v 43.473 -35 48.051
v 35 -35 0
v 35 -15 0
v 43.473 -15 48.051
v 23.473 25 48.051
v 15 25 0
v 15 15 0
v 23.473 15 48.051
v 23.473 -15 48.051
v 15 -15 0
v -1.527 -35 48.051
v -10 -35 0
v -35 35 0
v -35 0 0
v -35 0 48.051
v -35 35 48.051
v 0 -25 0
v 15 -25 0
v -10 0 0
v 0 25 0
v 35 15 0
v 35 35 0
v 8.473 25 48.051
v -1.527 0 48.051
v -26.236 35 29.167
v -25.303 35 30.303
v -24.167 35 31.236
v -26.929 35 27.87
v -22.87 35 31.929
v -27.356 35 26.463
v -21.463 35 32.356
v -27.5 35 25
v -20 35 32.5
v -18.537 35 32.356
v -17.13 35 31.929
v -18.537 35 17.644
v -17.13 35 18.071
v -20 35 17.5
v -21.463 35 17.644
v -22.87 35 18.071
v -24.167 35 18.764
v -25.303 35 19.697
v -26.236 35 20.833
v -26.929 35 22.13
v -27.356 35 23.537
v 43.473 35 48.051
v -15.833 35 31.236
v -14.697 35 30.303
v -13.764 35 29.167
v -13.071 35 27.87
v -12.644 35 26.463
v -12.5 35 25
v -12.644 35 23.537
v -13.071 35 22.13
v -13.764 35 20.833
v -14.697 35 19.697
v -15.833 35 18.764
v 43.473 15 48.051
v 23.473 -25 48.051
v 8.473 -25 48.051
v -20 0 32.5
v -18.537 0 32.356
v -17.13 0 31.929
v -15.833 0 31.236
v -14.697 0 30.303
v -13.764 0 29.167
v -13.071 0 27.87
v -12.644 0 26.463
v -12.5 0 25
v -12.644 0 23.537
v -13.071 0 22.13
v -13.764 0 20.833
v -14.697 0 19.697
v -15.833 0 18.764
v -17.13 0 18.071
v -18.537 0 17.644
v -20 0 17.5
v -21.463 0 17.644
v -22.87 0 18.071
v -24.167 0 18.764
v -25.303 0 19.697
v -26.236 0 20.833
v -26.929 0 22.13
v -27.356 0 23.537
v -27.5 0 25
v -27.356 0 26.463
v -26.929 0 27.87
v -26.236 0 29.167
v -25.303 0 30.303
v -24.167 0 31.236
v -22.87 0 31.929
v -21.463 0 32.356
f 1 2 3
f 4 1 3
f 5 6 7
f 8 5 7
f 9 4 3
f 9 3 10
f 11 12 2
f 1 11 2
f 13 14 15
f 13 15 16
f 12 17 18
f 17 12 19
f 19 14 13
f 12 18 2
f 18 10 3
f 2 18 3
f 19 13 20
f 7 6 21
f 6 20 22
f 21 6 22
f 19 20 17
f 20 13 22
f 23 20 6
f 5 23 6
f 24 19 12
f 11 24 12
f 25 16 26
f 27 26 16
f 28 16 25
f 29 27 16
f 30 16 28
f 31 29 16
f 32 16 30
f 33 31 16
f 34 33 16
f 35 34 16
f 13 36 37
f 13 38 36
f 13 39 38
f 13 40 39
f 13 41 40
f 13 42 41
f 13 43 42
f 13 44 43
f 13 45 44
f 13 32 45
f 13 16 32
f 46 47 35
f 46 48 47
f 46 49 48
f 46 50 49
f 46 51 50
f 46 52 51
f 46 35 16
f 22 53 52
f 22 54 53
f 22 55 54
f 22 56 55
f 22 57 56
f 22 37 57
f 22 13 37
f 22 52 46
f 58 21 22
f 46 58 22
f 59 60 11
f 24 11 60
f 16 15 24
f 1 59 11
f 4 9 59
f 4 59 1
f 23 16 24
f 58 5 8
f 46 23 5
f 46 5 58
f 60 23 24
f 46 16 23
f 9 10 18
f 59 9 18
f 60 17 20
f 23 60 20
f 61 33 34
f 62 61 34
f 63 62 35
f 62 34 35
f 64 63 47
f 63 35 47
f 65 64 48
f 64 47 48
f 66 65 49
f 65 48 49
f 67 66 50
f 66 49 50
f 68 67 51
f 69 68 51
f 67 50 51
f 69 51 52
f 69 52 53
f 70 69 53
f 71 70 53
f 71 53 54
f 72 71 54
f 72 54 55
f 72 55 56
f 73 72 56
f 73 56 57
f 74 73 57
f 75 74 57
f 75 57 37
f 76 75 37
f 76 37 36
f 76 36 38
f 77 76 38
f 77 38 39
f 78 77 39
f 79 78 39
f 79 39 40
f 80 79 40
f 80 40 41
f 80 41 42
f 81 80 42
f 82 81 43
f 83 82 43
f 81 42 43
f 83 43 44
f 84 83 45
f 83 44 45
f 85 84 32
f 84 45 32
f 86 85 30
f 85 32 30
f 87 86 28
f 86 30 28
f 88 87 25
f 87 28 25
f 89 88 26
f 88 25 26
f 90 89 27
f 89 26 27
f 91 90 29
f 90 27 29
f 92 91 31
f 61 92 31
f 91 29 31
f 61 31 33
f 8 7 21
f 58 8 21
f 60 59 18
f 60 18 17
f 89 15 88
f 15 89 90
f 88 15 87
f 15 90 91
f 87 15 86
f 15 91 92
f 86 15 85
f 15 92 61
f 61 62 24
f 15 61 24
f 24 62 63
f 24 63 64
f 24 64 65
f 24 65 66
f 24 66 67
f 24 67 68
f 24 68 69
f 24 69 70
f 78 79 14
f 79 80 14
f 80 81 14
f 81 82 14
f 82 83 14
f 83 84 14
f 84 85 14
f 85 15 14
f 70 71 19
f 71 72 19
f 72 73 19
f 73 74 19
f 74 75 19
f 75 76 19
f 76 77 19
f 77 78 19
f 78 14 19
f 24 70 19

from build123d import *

# Parameters (mm, degrees)
SKETCH4_W           = 35
SKETCH4_H           = 35
BOSS_EXTRUDE2_DEPTH = 48.050661441
SKETCH5_R           = 7.5
CUT_EXTRUDE1_DEPTH  = 44


with BuildPart() as part:
    # Sweep1: sweep along a path in Sketch3
    with BuildLine(Plane(origin=(0, 0, 0), x_dir=(1, 0, 0), z_dir=(0, 1, 0))) as sweep1_path:
        Line((55.06330006, -48.050661441), (46.590672007, 0))
    # Sketch1<2> → Sweep1 (sweep)
    with BuildSketch(Plane.XY):
        Polygon((0, 25), (0, -25), (15, -25), (15, -15), (35, -15), (35, -35), (-10, -35), (-10, 35), (35, 35), (35, 15), (15, 15), (15, 25), align=None)
    sweep(path=sweep1_path.line)

    # Sketch4 → Boss-Extrude2 (add)
    with BuildSketch(Plane.XY):
        with Locations((-17.5, 17.5)):
            Rectangle(SKETCH4_W, SKETCH4_H)
    extrude(amount=BOSS_EXTRUDE2_DEPTH)

    # Sketch5 → Cut-Extrude1 (cut)
    with BuildSketch(Plane(origin=(0, 35, 0), x_dir=(1, 0, 0), z_dir=(0, 1, 0))):
        with Locations(Location((-20, -25, 0), (0, 0, 270))):
            Circle(SKETCH5_R)
    extrude(amount=-CUT_EXTRUDE1_DEPTH, mode=Mode.SUBTRACT)


solid = part.part
